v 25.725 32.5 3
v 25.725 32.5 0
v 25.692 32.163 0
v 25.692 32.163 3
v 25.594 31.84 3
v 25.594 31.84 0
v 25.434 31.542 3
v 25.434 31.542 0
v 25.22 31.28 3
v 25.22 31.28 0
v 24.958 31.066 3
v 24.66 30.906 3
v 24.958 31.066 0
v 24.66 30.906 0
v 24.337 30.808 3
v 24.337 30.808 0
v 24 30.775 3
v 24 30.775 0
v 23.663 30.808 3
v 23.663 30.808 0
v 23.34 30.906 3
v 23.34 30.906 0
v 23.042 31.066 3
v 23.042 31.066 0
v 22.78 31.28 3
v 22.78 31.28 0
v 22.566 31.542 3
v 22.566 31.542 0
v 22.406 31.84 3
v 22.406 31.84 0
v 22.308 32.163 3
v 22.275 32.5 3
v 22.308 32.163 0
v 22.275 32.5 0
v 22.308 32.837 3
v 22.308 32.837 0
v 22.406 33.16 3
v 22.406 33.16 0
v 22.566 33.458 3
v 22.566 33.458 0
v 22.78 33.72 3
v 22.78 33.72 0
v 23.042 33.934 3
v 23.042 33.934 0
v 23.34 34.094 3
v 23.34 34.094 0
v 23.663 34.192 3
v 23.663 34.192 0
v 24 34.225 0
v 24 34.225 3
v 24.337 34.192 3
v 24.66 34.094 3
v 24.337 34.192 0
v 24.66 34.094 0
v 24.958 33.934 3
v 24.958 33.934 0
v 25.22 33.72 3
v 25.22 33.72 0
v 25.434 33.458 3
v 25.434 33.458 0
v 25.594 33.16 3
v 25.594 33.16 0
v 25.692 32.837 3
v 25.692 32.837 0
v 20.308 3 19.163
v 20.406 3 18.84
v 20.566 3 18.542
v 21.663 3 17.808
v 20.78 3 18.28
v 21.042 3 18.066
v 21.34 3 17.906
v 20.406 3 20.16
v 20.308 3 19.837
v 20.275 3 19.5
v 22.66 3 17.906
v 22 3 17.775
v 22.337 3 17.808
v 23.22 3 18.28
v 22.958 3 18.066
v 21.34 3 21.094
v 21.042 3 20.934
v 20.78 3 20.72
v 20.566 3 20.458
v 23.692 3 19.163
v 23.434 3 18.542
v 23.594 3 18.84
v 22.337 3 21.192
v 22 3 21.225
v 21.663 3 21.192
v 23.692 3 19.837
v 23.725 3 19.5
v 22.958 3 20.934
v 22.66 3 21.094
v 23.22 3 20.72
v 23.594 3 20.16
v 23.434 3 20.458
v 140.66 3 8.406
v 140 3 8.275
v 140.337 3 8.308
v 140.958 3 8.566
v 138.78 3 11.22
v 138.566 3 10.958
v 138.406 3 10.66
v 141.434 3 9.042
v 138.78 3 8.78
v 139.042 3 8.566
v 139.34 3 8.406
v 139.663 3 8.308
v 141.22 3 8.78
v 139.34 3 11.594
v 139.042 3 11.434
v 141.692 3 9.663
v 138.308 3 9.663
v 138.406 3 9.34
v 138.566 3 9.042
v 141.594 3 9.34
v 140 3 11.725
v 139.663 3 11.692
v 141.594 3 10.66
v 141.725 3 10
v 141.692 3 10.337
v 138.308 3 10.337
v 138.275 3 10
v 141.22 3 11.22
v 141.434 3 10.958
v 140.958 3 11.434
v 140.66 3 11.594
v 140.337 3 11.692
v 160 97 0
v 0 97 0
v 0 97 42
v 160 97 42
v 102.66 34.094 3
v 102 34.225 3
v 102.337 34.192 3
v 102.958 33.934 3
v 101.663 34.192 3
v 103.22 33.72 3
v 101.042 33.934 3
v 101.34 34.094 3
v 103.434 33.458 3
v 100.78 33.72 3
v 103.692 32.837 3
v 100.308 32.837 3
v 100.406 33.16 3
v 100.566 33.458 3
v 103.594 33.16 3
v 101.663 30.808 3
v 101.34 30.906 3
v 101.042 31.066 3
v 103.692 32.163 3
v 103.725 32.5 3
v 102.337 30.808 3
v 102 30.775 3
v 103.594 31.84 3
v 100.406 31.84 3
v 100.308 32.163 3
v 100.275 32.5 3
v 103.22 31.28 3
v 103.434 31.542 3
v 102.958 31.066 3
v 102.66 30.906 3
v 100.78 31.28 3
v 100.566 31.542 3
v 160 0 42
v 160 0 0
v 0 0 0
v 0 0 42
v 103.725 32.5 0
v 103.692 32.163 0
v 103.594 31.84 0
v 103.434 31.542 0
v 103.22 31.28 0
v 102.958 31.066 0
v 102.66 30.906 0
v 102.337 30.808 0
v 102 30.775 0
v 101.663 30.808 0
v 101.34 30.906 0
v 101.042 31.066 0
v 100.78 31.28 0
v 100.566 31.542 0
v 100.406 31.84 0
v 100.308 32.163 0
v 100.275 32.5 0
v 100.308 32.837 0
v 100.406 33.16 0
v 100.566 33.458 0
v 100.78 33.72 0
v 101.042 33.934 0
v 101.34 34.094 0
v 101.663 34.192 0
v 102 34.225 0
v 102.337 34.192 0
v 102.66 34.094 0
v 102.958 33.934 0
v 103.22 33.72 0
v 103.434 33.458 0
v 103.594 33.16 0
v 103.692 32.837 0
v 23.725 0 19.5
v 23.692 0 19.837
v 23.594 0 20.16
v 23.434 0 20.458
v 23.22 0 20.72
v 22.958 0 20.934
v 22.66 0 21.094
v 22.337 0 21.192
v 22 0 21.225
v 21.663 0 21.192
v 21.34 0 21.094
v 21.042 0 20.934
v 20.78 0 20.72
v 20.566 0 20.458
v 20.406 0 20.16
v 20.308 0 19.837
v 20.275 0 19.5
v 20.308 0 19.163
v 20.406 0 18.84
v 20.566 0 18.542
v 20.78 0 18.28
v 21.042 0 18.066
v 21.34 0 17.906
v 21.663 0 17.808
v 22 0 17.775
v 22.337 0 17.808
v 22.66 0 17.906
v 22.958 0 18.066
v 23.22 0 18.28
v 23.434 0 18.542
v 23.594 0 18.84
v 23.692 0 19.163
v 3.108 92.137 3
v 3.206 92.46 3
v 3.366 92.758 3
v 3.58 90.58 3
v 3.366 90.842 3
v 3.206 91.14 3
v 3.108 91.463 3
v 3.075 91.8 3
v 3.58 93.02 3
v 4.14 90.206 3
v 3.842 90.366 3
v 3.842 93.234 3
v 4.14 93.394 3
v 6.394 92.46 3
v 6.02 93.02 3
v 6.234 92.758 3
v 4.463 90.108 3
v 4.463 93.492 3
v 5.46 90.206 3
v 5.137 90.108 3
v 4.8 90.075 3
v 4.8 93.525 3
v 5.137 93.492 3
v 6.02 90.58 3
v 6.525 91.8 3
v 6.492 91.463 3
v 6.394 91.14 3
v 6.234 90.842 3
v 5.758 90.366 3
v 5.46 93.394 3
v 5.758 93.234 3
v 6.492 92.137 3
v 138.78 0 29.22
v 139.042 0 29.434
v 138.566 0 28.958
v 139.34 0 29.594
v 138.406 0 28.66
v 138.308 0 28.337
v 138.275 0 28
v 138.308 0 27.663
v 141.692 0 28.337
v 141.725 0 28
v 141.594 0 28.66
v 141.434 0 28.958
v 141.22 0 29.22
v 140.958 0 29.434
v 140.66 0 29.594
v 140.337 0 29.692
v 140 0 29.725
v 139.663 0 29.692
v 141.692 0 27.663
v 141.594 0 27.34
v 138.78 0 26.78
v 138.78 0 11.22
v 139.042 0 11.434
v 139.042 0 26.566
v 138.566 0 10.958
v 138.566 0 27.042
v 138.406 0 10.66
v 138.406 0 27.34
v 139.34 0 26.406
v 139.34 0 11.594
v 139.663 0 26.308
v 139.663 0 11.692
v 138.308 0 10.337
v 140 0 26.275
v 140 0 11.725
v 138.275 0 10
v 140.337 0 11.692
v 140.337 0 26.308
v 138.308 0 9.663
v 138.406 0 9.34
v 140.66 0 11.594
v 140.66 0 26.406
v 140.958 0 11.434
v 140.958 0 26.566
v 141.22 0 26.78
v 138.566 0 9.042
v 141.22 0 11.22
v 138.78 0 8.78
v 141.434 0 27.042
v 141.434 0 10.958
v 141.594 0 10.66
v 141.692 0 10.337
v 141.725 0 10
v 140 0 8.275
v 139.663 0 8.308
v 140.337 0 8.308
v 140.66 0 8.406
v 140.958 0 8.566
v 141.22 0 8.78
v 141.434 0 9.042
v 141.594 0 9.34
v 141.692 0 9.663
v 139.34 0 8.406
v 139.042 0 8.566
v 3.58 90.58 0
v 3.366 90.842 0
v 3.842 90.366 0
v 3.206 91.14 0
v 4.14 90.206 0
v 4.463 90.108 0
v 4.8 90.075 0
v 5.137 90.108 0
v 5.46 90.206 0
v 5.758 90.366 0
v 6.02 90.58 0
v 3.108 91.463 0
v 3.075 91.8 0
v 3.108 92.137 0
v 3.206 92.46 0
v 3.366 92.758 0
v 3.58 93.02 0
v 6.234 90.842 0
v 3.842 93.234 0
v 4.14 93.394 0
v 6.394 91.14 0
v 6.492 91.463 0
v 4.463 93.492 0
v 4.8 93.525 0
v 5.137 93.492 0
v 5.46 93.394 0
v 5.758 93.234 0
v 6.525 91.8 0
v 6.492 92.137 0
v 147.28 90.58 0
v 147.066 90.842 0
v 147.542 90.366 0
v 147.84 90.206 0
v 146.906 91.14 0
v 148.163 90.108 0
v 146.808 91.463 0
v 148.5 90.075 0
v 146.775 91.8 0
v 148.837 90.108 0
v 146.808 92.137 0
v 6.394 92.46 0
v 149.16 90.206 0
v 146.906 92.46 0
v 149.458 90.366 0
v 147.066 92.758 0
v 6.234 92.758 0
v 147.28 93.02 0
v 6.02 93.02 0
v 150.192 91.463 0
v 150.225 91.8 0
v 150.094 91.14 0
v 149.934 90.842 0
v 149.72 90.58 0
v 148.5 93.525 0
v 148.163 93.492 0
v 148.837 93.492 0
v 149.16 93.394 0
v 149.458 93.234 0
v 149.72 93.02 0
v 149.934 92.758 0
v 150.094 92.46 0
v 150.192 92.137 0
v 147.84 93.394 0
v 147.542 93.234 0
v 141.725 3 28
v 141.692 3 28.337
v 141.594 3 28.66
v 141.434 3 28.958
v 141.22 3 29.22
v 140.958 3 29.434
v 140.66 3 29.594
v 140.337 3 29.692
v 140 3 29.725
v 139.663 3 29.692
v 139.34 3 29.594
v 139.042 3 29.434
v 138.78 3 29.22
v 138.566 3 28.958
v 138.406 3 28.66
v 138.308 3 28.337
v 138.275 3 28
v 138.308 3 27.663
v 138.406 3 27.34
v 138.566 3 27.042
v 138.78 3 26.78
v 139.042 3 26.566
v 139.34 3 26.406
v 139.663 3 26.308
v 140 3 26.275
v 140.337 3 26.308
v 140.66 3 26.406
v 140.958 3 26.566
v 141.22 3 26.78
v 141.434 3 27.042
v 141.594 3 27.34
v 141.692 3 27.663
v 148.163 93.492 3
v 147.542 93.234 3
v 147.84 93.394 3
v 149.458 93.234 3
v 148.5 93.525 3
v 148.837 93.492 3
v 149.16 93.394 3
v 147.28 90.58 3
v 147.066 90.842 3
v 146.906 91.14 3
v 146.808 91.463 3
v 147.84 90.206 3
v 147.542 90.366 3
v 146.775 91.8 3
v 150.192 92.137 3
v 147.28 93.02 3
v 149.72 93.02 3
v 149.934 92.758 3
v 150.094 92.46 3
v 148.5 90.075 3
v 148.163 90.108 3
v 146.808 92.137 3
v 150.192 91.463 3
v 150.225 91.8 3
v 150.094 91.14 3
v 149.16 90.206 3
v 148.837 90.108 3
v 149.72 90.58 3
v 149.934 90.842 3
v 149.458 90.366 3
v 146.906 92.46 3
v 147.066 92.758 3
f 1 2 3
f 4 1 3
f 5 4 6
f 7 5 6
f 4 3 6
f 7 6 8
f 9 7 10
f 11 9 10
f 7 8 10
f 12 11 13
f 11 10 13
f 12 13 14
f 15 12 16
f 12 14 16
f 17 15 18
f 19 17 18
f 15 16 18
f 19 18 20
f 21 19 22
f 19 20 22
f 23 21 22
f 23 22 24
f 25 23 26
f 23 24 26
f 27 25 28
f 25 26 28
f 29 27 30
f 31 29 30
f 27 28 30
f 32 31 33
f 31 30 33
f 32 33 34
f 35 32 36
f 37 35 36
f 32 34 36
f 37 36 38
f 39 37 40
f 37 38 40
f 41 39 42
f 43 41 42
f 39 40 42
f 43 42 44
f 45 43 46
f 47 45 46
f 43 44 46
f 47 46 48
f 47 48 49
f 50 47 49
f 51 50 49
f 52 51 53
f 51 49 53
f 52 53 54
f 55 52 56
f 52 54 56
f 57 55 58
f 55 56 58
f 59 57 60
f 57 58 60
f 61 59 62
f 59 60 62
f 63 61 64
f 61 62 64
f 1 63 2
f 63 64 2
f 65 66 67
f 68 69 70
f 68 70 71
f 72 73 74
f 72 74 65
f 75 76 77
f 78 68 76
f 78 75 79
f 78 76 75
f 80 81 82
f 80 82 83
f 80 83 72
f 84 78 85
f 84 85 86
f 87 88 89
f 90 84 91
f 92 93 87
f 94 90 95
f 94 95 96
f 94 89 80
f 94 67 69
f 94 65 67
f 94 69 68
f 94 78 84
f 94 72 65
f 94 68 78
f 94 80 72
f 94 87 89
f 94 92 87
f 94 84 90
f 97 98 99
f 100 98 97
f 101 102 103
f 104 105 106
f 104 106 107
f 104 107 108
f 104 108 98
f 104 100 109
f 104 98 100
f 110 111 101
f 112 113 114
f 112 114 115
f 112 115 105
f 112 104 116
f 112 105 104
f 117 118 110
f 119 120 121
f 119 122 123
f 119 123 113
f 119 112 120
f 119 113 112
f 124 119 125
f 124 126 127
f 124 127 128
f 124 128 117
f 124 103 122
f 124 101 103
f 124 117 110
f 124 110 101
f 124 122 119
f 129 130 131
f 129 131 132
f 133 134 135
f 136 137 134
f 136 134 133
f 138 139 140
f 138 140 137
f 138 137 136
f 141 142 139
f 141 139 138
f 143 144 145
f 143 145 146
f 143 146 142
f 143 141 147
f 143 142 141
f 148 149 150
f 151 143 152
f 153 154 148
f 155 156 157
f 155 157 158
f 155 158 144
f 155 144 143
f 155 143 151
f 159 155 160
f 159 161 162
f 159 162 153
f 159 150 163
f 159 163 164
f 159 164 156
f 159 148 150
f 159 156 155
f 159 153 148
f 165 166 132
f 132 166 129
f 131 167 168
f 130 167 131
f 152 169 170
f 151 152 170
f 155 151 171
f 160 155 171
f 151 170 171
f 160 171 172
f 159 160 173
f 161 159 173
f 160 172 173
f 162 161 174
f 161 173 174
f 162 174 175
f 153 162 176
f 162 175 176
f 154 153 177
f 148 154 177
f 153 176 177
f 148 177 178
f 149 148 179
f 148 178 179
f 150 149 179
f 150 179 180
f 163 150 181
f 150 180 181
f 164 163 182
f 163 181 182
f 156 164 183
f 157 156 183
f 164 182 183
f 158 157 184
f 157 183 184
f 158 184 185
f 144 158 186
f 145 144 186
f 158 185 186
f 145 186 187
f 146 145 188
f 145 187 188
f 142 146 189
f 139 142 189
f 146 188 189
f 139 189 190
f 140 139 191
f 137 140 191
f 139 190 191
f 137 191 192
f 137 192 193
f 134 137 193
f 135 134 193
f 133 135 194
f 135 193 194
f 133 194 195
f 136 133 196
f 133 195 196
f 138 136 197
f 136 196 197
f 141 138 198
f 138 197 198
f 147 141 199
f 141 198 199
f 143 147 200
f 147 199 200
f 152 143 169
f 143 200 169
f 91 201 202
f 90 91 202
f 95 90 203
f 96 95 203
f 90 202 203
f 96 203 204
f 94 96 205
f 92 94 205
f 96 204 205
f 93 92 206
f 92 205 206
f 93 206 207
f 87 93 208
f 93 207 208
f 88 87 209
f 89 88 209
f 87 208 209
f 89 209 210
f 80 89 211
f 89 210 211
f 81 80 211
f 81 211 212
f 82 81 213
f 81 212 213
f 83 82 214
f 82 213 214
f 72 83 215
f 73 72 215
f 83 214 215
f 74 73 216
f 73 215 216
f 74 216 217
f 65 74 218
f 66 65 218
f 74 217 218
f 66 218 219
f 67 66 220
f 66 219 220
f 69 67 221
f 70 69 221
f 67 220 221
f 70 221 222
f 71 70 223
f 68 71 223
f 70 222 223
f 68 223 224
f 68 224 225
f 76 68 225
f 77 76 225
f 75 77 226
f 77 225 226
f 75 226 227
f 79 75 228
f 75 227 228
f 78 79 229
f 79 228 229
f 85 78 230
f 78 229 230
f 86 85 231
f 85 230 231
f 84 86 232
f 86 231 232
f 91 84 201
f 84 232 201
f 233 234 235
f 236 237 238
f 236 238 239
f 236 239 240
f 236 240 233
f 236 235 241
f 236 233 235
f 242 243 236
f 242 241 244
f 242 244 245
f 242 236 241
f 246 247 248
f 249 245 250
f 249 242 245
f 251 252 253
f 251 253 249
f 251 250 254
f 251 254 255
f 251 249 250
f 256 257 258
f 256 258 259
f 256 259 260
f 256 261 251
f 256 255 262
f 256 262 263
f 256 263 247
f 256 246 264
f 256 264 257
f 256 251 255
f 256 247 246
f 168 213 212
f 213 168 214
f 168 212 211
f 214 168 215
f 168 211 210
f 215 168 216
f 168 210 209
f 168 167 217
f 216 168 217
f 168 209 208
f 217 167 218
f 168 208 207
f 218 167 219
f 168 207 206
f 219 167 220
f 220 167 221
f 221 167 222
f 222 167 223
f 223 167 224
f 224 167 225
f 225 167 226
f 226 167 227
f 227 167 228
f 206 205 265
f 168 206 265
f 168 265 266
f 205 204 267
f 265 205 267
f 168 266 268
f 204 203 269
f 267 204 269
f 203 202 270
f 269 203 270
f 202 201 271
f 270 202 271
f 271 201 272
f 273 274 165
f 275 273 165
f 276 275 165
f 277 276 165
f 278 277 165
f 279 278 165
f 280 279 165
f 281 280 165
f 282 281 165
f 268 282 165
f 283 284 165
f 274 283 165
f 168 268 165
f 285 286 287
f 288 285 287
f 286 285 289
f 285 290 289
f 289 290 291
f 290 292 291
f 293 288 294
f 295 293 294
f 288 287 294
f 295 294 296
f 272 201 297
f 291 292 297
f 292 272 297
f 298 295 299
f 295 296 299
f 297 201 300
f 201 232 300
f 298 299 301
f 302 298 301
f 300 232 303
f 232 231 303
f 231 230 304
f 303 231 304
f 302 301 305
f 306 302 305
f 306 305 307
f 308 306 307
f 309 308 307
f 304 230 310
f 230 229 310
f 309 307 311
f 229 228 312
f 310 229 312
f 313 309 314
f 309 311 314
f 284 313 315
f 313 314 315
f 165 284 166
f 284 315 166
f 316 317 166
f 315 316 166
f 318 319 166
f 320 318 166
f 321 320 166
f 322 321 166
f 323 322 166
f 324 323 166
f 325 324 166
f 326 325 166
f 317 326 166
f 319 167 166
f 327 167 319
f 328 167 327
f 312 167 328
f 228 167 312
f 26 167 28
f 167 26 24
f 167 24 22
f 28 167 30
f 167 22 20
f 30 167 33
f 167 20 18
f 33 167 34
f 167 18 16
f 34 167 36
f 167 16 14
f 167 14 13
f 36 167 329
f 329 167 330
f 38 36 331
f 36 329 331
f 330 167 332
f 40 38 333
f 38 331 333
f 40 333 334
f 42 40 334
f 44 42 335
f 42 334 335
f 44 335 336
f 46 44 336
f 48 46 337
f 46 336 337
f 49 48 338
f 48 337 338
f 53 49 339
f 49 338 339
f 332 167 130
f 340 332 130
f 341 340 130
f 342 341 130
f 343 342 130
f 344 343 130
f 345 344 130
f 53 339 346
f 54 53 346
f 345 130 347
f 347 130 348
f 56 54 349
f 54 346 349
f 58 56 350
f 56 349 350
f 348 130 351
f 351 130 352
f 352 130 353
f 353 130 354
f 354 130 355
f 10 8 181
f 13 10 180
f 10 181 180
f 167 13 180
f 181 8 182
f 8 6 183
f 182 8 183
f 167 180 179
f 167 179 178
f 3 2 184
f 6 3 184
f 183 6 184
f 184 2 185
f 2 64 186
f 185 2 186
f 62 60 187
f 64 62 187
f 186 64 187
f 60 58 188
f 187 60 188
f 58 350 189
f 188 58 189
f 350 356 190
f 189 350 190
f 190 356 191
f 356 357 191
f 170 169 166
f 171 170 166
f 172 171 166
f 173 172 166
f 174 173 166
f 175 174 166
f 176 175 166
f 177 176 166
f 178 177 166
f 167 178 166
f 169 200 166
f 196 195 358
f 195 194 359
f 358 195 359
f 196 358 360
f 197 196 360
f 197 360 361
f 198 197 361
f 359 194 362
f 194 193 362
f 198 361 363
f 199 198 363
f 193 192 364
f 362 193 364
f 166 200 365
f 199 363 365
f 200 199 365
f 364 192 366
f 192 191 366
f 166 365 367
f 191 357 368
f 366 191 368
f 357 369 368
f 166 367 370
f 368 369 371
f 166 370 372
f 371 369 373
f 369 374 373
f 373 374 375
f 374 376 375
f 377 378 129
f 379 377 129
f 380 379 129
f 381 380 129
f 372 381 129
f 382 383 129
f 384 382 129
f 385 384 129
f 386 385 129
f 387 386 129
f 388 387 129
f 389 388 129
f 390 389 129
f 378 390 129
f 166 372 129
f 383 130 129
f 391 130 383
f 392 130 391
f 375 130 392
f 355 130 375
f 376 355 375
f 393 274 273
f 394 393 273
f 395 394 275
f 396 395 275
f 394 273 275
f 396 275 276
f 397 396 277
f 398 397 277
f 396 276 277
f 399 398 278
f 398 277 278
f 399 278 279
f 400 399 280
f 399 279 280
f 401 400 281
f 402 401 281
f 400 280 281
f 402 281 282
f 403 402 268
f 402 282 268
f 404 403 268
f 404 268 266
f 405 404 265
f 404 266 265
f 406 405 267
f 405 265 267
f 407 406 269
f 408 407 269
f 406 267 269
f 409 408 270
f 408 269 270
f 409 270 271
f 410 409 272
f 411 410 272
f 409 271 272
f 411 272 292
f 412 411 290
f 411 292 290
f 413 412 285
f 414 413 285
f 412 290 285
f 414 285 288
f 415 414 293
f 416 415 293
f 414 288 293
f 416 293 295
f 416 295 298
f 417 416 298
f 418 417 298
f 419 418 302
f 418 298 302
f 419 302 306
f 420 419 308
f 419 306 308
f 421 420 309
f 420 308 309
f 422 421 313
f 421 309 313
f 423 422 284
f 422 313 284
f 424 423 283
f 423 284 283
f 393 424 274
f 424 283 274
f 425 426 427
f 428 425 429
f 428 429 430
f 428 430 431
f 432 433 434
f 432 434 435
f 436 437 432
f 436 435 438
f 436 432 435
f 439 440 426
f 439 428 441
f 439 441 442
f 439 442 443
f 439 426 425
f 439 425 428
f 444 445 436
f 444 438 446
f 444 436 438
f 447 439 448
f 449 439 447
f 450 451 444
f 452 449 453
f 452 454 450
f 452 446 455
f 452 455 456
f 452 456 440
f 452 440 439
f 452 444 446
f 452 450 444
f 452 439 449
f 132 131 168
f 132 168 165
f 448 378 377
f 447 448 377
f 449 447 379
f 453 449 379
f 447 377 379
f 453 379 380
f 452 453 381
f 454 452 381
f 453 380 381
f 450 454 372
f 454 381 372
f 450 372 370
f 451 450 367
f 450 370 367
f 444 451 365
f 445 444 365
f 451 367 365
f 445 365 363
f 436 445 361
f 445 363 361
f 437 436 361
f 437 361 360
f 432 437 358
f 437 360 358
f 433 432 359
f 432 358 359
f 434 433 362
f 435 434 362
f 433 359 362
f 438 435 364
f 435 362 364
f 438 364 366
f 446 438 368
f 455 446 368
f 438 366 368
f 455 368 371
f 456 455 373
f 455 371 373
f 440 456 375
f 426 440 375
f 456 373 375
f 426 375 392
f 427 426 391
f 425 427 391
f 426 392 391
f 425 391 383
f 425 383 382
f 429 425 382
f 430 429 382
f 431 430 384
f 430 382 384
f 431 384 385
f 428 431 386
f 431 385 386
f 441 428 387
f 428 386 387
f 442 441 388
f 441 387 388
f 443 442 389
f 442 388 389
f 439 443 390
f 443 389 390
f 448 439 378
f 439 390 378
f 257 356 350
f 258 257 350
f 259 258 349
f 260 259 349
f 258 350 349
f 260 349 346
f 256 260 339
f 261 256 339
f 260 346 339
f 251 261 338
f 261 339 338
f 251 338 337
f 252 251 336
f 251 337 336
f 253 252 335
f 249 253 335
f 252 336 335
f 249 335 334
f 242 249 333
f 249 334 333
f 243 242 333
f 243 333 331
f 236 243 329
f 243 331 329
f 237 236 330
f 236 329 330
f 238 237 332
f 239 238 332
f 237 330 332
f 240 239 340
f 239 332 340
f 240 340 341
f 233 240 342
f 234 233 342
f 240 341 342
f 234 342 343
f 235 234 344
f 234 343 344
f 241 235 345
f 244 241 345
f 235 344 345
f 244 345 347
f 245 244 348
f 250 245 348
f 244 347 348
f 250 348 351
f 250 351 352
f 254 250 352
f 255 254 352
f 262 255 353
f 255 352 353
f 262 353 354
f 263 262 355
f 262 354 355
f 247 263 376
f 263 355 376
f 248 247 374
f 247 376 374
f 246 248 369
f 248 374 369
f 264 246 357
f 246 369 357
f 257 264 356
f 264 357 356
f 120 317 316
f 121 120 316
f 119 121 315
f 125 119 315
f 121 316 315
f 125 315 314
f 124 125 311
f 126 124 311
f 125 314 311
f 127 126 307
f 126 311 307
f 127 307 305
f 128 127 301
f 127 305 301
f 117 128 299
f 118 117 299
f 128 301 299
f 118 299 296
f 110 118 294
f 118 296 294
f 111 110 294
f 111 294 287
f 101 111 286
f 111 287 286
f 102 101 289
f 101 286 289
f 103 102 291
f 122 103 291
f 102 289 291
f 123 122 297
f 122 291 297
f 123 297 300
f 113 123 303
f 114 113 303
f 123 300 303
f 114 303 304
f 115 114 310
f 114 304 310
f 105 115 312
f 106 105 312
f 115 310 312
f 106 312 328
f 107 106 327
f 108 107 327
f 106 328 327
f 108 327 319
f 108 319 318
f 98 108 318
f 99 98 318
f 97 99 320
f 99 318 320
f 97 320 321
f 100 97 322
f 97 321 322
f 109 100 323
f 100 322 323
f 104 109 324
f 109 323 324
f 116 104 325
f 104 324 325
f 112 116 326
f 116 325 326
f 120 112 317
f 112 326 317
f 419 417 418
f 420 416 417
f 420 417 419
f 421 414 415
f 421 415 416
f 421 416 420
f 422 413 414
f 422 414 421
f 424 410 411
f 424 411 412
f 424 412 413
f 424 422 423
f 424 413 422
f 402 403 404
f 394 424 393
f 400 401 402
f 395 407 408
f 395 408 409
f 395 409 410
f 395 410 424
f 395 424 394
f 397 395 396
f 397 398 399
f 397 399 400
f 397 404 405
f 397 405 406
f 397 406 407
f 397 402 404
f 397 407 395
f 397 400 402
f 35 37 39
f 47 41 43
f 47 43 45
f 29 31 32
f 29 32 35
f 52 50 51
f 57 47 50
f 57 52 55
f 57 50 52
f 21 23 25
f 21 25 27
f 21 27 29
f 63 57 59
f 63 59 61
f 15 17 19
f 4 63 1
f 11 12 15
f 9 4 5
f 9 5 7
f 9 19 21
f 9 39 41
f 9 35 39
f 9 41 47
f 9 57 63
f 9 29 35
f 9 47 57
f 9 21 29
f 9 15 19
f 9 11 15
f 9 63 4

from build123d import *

# Parameters (mm, degrees)
F0_W     = 160
F0_H     = 97
F1_DEPTH = 42
F2_R     = 1.725
F3_DEPTH = 3
F4_R     = 1.725
F5_DEPTH = 3


with BuildPart() as f1:
    # F0 (on Top) → F1 (new body)
    with BuildSketch(Plane.XY):
        with Locations((80, 48.5)):
            Rectangle(F0_W, F0_H)
    extrude(amount=F1_DEPTH)

    # F2 (on face) → F3 (cut)
    with BuildSketch(Plane.XZ):
        with Locations((140, 10)):
            Circle(F2_R)
        with Locations((140, 28)):
            Circle(F2_R)
        with Locations((22, 19.5)):
            Circle(F2_R)
    extrude(amount=-F3_DEPTH, mode=Mode.SUBTRACT)

    # F4 (on face) → F5 (cut)
    with BuildSketch(Plane(origin=(0, 0, 0), x_dir=(1, 0, 0), z_dir=(0, 0, -1))):
        with Locations((4.8, -91.8)):
            Circle(F4_R)
        with Locations((24, -32.5)):
            Circle(F4_R)
        with Locations((148.5, -91.8)):
            Circle(F4_R)
        with Locations((102, -32.5)):
            Circle(F4_R)
    extrude(amount=-F5_DEPTH, mode=Mode.SUBTRACT)


solid = f1.part
